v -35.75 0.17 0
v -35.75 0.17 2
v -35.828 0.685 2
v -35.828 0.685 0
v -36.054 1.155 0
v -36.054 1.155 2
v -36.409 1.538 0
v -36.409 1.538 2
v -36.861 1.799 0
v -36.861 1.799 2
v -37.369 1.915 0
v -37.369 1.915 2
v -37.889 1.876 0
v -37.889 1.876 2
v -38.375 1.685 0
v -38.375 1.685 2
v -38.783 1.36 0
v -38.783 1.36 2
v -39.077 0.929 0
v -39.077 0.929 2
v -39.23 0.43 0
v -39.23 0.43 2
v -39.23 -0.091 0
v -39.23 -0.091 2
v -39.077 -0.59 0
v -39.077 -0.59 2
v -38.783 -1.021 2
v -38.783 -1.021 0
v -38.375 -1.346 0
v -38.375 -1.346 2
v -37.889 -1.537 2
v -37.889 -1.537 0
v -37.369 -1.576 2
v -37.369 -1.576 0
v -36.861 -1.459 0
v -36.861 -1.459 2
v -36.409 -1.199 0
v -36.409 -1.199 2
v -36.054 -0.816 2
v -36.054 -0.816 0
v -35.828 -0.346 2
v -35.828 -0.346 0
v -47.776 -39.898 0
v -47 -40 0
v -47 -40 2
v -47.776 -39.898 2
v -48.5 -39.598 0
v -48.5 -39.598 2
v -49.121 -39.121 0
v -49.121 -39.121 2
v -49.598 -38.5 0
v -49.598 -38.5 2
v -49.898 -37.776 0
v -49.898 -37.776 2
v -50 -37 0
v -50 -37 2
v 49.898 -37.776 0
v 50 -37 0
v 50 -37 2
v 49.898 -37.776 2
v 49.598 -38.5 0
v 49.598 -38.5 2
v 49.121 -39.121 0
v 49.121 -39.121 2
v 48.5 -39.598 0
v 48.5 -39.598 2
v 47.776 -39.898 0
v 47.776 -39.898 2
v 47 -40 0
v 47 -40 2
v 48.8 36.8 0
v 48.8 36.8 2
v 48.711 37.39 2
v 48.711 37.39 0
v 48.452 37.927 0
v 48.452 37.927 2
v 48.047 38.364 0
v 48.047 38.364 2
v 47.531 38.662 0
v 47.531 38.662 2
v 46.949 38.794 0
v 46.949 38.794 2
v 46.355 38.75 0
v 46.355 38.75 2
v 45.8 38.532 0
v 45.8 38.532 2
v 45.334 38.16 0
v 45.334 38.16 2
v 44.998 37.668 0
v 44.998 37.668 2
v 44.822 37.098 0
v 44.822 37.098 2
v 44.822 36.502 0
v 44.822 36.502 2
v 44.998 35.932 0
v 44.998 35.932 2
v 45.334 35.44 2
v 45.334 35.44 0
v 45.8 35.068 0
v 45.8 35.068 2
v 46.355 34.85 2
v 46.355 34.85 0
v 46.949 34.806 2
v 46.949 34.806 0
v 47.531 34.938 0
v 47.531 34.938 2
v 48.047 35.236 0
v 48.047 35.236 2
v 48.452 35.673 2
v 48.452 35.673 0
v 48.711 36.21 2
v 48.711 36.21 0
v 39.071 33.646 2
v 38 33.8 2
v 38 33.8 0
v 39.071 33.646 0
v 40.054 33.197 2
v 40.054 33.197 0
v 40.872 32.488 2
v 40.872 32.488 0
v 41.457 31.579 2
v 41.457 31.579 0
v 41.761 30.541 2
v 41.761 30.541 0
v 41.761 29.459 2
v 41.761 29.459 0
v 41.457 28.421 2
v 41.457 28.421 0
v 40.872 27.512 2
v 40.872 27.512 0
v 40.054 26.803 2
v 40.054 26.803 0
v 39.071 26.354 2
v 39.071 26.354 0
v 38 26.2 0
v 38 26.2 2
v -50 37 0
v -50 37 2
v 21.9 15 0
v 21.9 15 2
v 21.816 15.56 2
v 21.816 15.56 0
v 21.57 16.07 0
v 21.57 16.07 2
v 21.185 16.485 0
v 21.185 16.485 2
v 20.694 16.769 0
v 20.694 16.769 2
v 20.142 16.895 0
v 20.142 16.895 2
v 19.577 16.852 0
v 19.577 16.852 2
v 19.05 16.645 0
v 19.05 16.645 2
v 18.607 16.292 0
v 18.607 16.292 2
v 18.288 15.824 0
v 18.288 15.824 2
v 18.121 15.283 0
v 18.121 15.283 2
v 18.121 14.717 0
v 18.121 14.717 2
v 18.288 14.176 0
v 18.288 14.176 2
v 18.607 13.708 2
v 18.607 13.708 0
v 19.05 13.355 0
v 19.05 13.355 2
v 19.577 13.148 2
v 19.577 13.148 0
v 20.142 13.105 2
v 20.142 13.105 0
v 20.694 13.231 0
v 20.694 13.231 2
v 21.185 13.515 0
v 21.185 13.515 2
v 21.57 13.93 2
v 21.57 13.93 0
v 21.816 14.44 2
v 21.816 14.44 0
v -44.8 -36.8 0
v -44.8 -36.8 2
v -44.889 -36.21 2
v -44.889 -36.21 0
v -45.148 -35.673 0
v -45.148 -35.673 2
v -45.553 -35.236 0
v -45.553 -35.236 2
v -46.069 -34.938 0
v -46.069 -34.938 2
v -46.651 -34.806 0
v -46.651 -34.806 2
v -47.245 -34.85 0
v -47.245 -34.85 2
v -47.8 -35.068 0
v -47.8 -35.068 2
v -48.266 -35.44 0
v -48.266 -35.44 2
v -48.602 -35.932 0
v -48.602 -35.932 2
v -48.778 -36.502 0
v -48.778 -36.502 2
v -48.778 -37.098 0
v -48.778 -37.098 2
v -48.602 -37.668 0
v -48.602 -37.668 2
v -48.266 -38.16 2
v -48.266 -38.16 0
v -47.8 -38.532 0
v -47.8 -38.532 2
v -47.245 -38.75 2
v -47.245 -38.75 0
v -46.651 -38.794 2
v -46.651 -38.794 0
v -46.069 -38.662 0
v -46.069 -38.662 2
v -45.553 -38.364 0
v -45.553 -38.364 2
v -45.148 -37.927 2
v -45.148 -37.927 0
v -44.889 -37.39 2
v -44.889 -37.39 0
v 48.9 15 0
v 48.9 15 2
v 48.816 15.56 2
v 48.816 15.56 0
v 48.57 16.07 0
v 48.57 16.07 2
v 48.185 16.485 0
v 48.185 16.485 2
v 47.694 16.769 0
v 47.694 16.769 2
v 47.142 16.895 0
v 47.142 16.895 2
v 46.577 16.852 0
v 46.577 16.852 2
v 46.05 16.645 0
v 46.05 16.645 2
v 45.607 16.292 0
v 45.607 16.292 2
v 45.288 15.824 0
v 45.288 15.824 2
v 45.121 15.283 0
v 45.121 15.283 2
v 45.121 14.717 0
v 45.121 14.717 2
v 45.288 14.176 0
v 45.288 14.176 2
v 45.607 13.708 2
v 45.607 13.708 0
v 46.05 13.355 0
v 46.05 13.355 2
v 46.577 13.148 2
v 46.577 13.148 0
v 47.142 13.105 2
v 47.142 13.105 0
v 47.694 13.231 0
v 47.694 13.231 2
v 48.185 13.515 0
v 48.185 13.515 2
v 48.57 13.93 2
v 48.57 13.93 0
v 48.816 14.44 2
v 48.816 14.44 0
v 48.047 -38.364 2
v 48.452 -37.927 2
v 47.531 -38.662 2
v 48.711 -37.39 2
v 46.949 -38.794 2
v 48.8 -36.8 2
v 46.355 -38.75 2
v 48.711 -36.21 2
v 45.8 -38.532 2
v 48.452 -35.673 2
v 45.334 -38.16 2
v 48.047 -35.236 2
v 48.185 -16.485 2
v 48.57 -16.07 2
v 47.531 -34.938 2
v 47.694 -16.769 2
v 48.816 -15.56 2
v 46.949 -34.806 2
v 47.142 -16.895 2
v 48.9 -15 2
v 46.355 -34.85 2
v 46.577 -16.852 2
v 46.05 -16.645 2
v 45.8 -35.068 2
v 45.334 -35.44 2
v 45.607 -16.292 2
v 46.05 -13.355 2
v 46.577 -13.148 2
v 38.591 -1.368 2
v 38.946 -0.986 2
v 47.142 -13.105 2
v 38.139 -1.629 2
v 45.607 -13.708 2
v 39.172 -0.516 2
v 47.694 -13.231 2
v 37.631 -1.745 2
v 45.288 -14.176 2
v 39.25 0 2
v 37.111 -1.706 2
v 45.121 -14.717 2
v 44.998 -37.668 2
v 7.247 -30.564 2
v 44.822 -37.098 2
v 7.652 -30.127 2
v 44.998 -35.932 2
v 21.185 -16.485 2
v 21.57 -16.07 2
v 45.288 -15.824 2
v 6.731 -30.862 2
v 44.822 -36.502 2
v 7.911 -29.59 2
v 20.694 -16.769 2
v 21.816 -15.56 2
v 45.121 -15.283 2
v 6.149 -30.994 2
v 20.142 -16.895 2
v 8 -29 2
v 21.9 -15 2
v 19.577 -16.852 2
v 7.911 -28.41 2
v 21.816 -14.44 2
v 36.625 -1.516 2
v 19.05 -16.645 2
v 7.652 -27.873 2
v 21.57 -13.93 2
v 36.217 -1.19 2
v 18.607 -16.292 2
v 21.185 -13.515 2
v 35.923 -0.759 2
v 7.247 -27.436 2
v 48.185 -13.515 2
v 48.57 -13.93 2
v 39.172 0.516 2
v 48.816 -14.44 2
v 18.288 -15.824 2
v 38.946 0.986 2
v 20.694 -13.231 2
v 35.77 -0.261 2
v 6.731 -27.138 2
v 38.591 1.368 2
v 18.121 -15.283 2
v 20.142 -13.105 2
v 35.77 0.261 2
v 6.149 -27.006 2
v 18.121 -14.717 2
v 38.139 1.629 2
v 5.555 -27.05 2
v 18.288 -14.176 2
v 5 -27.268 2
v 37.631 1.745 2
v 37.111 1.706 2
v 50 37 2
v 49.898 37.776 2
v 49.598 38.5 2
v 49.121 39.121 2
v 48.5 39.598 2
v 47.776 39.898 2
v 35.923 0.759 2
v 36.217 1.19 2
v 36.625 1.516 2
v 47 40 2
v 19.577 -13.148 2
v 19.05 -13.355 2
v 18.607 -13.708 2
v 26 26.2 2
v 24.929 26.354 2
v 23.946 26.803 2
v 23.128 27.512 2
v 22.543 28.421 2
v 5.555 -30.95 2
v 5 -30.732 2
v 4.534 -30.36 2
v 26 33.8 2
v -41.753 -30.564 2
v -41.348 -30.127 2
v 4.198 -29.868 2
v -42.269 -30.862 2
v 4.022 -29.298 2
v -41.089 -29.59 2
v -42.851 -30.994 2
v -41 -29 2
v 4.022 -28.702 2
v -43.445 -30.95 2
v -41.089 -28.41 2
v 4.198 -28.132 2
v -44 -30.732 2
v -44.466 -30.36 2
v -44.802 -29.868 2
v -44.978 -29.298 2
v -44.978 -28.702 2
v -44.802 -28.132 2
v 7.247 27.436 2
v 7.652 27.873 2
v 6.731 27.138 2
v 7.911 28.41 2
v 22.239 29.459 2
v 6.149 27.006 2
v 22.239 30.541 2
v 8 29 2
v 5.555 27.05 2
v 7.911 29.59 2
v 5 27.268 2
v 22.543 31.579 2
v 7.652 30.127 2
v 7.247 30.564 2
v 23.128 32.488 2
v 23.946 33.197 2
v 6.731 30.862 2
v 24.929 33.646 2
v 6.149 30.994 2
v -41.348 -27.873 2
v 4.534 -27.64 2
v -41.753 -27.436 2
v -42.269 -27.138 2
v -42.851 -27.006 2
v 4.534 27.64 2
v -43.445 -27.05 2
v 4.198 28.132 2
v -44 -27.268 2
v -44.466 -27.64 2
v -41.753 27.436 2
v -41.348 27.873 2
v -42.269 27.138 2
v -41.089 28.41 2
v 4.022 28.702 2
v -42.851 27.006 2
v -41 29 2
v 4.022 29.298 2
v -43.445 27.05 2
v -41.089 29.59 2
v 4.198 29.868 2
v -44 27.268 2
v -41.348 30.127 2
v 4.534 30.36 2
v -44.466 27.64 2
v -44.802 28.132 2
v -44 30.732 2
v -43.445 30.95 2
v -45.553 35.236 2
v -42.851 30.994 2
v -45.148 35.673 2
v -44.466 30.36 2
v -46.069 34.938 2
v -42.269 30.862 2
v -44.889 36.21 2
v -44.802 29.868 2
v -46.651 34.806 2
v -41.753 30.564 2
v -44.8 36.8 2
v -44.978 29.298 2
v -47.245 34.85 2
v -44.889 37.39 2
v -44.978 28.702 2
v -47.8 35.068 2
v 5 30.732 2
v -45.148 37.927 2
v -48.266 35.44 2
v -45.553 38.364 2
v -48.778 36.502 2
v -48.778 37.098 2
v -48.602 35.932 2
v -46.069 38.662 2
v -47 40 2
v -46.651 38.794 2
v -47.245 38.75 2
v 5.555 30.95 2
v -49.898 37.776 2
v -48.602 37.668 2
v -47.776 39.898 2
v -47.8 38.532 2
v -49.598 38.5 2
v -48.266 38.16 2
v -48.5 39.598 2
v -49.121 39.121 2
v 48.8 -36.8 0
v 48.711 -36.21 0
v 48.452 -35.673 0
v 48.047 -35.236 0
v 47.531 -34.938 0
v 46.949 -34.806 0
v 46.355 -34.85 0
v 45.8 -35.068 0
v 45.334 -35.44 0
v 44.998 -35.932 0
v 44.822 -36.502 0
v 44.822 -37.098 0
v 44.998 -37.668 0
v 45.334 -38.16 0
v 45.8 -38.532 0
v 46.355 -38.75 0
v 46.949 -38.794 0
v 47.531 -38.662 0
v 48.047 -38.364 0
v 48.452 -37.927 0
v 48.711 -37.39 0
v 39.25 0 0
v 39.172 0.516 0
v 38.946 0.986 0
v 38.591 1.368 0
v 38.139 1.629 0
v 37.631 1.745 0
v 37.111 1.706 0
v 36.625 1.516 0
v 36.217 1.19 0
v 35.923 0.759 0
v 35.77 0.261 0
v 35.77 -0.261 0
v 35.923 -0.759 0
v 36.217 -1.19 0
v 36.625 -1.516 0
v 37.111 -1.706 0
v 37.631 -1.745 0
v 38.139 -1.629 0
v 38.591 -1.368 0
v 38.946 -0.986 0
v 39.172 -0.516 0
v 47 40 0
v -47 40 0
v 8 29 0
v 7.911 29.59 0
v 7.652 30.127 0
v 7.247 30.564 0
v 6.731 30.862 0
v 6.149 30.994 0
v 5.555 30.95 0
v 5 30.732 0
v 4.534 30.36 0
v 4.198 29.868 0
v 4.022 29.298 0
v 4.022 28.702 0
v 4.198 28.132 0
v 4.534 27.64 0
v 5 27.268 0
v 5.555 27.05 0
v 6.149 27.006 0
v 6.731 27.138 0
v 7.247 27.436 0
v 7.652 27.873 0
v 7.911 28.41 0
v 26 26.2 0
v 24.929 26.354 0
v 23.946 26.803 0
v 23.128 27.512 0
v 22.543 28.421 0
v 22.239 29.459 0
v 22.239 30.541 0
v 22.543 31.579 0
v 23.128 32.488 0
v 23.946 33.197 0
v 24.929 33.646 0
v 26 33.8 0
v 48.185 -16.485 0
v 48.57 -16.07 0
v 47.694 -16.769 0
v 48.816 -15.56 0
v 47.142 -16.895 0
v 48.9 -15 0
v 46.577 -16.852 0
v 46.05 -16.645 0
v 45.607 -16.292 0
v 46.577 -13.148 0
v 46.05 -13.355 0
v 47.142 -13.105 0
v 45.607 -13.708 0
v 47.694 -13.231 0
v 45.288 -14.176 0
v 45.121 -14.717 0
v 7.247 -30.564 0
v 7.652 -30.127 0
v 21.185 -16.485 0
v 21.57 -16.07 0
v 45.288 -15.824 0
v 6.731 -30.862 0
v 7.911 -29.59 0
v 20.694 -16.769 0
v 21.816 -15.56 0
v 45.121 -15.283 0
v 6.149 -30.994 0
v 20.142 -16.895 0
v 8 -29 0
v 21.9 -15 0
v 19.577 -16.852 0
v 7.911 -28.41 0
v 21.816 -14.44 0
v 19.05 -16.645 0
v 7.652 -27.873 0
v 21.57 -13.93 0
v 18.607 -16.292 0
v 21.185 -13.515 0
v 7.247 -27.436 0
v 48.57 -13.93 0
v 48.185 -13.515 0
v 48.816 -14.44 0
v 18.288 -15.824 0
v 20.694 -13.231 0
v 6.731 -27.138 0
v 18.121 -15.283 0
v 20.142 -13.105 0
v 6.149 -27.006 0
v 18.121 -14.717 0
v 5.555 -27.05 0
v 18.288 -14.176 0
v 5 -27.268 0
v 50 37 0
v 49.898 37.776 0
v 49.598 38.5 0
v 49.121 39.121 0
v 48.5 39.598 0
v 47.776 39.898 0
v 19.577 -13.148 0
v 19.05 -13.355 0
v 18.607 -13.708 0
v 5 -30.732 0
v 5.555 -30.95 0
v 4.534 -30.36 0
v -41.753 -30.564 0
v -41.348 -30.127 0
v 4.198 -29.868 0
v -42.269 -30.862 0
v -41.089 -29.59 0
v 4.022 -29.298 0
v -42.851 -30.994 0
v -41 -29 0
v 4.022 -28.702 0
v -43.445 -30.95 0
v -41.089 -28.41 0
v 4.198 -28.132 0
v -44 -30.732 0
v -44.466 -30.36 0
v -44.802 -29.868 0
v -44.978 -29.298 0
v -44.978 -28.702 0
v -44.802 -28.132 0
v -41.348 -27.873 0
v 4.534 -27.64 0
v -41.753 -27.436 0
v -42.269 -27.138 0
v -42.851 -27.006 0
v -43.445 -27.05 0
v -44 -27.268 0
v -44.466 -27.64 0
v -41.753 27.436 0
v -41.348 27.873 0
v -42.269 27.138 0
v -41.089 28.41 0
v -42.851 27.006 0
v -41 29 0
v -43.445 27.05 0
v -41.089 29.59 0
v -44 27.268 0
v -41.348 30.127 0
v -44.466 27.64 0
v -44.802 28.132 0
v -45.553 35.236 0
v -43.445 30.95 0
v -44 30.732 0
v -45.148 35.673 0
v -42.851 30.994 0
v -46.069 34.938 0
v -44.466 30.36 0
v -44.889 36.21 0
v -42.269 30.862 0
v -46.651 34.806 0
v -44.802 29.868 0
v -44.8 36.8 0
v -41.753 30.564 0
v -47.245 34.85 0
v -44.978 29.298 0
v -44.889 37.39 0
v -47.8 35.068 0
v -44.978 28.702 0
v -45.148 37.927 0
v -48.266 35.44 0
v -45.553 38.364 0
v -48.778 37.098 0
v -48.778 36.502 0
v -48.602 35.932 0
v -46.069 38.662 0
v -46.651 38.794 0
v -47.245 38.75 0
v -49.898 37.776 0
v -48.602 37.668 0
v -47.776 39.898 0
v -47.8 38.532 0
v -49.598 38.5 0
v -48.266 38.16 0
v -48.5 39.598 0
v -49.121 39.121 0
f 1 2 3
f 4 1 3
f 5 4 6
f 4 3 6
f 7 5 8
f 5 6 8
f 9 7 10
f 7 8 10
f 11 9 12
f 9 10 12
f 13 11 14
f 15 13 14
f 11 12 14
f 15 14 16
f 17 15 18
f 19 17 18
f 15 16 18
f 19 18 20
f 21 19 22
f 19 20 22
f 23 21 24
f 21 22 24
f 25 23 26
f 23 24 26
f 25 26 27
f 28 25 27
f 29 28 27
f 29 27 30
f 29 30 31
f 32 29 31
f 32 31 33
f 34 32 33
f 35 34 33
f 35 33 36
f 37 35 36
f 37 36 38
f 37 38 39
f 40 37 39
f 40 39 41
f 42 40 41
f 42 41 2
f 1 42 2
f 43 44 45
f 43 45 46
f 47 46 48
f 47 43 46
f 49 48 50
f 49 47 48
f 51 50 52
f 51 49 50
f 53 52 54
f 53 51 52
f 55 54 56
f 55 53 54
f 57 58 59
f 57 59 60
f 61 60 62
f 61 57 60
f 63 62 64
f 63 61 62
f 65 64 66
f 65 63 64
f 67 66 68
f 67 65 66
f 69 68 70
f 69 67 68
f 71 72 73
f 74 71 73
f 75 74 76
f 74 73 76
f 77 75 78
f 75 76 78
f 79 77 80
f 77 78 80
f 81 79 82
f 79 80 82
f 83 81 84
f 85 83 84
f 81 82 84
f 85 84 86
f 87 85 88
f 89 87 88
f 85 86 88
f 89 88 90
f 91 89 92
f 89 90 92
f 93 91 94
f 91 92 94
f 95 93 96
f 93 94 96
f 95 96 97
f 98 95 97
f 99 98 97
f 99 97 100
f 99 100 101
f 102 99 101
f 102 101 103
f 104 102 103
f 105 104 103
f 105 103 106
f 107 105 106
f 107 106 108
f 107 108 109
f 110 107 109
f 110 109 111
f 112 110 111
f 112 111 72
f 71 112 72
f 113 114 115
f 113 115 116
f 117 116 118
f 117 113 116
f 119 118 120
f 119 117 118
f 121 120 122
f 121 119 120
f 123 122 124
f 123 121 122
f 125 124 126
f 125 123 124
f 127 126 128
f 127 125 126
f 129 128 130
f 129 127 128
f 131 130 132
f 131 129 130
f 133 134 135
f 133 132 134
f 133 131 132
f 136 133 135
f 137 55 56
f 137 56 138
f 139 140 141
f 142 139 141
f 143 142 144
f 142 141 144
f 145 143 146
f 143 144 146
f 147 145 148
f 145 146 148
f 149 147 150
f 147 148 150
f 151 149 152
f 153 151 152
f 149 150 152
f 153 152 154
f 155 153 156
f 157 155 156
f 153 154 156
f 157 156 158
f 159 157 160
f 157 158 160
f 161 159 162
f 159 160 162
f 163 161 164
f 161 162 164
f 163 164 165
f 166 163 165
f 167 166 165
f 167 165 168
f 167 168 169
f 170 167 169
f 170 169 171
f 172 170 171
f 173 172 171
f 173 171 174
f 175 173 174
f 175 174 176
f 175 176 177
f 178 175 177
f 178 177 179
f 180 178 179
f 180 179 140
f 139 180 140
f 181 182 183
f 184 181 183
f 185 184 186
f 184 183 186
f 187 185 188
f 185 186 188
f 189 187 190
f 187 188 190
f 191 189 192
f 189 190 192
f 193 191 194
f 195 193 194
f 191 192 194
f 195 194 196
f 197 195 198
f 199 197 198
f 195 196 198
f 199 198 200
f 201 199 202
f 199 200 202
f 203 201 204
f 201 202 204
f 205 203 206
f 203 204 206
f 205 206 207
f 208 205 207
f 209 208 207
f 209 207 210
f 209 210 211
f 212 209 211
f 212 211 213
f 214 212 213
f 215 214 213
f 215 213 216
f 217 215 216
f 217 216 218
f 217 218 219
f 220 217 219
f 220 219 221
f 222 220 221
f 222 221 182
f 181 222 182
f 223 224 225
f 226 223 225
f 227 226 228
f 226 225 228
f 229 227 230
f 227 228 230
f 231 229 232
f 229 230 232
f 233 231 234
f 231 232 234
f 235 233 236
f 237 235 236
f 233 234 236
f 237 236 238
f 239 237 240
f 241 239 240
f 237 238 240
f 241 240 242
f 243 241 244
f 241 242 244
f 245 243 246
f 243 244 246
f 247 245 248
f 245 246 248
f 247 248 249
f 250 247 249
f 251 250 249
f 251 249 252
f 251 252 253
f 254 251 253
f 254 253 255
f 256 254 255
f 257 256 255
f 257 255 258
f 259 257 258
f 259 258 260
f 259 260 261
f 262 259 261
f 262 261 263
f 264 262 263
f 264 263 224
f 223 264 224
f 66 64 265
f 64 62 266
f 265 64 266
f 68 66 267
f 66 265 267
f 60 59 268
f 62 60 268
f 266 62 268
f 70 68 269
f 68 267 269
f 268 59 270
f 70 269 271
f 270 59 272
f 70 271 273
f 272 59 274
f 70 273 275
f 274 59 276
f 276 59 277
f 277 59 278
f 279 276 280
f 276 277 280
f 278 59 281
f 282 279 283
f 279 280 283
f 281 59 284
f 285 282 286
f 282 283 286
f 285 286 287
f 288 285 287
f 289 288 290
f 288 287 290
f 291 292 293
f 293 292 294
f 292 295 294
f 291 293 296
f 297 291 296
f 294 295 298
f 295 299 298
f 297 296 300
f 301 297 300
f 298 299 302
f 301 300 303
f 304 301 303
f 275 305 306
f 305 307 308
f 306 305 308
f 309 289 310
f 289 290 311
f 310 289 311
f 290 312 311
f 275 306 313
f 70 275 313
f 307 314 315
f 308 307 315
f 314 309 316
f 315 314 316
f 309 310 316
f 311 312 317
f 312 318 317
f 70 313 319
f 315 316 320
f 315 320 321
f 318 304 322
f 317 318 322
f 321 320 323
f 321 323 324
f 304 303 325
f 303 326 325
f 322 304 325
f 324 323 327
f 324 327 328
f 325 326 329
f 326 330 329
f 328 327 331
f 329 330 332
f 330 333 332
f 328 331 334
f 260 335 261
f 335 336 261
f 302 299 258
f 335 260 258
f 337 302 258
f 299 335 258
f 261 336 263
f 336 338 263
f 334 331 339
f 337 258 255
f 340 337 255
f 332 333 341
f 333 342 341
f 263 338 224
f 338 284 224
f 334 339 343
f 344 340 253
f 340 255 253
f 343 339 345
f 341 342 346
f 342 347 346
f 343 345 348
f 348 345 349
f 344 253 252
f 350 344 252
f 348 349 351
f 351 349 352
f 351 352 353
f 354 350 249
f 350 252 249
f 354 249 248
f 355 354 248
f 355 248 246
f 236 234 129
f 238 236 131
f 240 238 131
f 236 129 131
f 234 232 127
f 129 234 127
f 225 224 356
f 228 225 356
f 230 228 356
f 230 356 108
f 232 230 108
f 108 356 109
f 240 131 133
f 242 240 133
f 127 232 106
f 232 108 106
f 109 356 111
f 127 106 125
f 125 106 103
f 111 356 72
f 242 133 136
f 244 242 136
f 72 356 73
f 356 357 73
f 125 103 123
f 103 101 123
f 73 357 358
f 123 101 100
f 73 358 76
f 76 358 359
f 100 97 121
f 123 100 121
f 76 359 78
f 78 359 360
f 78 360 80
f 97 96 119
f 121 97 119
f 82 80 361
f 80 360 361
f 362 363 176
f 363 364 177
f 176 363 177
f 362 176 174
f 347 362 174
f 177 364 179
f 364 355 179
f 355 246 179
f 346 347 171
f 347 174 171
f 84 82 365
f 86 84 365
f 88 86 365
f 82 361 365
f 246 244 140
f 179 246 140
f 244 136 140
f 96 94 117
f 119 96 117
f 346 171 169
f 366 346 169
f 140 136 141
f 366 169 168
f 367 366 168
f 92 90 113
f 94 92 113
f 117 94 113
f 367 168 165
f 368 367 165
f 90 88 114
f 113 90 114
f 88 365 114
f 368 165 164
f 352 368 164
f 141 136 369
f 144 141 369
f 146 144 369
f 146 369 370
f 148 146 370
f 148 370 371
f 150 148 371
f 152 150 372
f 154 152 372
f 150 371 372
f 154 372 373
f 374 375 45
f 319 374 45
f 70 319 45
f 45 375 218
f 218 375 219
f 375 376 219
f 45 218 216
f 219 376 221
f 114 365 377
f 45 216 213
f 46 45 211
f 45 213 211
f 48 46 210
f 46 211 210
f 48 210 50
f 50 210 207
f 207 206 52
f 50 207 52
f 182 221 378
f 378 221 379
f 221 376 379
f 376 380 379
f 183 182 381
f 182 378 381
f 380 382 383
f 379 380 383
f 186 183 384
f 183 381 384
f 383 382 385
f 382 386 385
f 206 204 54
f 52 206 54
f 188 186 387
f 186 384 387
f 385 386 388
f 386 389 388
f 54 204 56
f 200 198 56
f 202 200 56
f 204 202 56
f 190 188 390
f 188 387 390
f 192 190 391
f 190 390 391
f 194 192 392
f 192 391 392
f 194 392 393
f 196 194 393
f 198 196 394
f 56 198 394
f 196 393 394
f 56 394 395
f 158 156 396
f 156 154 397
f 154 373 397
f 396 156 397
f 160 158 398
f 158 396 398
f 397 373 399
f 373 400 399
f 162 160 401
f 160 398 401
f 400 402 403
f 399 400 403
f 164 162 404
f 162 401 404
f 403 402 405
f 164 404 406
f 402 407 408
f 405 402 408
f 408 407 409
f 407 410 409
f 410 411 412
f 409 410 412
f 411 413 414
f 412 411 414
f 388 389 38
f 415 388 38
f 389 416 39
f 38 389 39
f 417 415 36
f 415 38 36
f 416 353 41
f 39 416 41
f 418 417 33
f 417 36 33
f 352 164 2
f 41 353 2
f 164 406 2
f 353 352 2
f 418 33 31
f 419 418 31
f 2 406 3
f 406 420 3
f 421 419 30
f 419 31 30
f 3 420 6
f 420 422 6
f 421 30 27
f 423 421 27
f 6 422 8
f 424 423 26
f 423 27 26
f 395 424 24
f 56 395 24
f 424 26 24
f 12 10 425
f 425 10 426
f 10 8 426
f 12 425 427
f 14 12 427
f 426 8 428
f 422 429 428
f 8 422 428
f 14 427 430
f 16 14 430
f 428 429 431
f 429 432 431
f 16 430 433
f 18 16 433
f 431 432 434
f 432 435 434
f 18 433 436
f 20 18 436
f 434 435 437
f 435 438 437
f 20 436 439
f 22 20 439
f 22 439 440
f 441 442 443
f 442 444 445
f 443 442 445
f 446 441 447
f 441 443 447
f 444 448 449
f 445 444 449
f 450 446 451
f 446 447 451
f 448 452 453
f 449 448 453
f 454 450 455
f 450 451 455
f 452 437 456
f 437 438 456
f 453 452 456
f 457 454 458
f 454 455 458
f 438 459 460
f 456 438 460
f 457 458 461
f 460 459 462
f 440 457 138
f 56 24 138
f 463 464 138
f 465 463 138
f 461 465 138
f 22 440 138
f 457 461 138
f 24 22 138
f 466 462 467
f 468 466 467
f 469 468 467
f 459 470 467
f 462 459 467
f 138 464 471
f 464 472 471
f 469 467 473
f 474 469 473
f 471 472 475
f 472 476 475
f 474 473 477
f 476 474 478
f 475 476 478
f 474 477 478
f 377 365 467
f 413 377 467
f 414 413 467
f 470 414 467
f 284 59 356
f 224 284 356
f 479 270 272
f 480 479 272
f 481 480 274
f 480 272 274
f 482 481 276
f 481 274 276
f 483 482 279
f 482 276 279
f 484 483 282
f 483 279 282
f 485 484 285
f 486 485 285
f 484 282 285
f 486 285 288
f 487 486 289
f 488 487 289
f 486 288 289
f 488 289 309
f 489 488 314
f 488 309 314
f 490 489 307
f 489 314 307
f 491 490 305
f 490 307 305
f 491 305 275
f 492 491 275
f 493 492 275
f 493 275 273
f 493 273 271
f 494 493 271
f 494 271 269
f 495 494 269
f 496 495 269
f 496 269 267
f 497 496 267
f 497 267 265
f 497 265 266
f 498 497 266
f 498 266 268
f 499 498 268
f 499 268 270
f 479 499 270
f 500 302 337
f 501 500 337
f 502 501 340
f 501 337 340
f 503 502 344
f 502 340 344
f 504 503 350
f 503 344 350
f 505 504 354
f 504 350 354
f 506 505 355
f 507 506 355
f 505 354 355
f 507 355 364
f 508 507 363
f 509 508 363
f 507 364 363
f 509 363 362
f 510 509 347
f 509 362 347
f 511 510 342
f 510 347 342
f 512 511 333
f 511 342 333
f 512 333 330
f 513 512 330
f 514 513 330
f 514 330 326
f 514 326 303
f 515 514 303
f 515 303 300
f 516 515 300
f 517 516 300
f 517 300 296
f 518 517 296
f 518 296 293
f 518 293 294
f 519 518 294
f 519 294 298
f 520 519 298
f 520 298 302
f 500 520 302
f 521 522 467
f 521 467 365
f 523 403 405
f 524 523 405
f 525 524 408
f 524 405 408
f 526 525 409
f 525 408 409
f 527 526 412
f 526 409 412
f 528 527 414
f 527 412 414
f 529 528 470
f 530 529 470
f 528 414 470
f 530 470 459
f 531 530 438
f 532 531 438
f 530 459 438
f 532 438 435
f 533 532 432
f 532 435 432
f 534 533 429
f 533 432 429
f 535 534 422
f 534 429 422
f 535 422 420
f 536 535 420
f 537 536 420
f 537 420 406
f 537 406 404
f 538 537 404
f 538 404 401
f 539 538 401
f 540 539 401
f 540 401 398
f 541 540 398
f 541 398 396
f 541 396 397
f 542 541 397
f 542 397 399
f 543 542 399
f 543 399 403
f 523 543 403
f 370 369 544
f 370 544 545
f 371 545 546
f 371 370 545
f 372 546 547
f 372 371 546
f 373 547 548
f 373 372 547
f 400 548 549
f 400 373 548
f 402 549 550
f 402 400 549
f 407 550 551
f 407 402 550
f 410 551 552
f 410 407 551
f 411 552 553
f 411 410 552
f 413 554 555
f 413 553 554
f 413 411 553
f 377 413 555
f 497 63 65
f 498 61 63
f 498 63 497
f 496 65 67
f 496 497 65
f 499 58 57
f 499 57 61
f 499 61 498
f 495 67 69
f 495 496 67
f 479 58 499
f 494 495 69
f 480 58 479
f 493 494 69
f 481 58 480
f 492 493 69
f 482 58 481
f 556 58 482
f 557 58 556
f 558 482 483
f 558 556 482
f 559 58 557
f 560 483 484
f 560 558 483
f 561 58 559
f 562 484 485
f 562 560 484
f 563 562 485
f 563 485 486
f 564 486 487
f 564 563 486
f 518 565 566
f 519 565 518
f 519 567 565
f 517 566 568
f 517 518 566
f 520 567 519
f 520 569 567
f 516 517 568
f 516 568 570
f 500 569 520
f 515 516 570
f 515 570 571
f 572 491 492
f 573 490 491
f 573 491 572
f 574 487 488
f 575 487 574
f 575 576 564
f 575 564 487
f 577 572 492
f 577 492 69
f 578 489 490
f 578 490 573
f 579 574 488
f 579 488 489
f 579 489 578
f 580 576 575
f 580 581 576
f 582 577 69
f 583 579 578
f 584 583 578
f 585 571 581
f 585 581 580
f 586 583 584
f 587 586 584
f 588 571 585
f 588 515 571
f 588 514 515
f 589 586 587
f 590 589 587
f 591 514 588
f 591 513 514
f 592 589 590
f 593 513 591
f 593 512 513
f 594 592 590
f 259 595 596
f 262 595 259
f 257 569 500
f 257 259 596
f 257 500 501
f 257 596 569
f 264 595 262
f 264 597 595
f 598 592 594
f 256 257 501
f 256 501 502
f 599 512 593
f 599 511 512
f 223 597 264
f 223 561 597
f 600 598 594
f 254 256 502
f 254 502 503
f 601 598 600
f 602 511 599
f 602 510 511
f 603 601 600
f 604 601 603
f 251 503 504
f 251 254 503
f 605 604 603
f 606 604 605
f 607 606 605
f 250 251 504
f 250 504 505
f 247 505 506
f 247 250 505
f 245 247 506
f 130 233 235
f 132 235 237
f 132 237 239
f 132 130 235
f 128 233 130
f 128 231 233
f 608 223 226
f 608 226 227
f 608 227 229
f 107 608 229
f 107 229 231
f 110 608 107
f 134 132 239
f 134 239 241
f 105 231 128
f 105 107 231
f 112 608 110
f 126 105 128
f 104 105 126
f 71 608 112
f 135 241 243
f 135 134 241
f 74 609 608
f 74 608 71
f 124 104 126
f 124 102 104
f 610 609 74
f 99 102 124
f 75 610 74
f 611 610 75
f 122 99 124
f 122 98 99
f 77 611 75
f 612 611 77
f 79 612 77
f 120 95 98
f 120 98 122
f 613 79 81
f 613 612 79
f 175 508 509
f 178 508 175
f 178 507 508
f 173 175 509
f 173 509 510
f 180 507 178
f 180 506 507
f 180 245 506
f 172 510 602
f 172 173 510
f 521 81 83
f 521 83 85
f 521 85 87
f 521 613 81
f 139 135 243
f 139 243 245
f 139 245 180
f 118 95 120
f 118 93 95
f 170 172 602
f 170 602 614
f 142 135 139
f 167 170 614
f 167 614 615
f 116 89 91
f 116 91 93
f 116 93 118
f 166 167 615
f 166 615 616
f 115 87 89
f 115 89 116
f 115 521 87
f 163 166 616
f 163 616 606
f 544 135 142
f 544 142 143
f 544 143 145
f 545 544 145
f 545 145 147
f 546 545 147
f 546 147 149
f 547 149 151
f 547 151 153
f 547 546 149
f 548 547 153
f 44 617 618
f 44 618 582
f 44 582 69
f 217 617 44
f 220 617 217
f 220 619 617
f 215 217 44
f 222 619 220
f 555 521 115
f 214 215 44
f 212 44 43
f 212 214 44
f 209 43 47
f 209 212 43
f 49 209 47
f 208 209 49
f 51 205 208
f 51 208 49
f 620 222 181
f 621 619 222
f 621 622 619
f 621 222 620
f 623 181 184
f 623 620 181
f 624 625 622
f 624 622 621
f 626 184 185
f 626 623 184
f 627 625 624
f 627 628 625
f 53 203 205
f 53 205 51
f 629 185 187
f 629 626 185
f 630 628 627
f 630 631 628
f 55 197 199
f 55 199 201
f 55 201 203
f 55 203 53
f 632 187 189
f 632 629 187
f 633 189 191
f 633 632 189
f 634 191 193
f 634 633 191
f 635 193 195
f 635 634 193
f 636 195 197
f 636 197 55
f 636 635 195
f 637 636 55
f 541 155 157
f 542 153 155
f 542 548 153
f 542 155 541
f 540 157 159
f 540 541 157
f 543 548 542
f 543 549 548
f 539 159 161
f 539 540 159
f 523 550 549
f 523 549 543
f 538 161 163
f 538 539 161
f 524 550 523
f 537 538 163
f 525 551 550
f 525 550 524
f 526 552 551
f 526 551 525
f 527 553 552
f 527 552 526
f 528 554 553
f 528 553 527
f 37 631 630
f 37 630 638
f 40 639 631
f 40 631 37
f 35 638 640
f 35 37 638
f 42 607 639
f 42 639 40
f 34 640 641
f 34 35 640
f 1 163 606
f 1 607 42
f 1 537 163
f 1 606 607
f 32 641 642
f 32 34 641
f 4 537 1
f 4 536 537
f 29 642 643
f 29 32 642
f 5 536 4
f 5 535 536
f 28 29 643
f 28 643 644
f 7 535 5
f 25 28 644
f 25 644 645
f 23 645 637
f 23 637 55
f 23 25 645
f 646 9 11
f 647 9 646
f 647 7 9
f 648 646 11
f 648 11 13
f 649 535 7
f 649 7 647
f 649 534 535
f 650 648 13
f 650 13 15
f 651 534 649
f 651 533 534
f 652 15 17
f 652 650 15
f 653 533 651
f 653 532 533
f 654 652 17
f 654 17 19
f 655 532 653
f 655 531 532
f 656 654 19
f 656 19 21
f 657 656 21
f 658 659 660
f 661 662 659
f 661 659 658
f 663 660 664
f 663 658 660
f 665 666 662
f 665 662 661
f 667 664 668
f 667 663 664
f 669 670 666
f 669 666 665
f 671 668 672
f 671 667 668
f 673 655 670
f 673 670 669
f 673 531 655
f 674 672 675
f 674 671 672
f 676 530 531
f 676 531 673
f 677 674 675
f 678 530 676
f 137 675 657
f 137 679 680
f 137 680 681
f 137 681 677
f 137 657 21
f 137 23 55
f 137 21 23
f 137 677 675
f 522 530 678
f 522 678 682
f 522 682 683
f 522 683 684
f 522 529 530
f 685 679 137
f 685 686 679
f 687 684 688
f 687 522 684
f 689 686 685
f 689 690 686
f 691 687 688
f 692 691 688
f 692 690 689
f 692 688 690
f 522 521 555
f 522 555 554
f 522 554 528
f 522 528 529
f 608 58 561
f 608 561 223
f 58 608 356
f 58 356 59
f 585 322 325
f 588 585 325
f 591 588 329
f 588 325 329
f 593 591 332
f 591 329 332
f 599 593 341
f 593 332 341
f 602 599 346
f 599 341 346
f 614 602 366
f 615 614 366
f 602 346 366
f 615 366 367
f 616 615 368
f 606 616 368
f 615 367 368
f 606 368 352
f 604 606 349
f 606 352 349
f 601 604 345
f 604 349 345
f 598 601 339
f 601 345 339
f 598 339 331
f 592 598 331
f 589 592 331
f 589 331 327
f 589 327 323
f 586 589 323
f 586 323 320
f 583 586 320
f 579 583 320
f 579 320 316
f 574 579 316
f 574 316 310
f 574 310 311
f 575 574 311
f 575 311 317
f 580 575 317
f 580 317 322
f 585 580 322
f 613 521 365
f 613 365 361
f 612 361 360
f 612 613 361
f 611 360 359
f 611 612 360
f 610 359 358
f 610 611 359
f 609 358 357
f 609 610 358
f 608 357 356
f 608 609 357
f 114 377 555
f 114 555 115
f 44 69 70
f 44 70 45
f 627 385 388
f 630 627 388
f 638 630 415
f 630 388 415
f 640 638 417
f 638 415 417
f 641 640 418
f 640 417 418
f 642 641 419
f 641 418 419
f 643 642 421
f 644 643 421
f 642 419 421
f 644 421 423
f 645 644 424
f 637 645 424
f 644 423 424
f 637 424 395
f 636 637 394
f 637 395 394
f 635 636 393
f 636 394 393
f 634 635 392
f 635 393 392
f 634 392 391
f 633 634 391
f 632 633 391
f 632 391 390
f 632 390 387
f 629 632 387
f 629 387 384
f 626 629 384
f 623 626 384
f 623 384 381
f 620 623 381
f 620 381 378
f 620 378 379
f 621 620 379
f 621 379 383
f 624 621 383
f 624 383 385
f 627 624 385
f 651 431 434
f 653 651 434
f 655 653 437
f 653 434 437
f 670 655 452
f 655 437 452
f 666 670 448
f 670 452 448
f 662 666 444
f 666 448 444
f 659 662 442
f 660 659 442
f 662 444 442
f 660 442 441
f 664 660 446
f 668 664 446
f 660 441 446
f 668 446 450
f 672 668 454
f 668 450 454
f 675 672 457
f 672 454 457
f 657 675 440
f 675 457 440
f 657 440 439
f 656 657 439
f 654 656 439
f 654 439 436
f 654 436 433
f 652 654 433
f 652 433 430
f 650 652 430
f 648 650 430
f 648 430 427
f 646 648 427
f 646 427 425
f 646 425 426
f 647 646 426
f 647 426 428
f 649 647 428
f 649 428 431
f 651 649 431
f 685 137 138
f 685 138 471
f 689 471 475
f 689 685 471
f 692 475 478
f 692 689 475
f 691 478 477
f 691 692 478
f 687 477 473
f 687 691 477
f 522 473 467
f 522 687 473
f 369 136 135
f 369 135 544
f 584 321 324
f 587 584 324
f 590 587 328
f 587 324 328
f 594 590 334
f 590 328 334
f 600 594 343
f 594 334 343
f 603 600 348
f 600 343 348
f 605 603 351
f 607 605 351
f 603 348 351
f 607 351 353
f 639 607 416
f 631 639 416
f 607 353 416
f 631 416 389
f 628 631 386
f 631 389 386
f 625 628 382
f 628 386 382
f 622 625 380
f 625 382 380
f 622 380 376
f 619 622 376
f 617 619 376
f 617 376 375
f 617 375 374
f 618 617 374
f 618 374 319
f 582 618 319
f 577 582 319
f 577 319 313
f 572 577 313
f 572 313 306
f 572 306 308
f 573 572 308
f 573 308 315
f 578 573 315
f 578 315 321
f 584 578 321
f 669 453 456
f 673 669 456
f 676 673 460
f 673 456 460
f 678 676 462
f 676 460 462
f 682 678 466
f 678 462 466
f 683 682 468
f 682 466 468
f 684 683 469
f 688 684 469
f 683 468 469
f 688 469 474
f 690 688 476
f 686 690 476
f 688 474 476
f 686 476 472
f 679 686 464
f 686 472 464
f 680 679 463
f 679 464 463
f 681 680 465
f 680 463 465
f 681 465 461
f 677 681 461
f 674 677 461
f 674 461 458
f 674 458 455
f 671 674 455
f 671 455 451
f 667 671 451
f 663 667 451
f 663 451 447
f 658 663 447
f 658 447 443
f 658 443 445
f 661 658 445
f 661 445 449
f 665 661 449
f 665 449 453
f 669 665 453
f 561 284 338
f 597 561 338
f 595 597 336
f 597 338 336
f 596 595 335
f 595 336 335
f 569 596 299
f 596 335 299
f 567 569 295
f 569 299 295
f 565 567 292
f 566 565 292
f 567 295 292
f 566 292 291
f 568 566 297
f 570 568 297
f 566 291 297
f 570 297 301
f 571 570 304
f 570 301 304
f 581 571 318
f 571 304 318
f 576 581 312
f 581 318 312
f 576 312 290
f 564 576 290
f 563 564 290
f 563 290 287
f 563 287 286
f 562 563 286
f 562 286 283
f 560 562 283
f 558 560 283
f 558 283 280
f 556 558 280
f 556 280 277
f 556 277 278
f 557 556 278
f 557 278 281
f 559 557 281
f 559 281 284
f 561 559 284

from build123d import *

# Parameters (mm, degrees)
EXTRUDE_1_DEPTH     = 2
SKETCH_2_R          = 2
SKETCH_2_R_2        = 1.9
CUT_EXTRUDE_1_DEPTH = 3
CUT_EXTRUDE_2_DEPTH = 3
SKETCH_4_R          = 1.75
CUT_EXTRUDE_3_DEPTH = 3


with BuildPart() as part:
    # 草图1 → 凸台-拉伸1 (new body)
    with BuildSketch(Plane.XY):
        with BuildLine():
            Line((-47, 40), (47, 40))
            ThreePointArc((47, 40), (49.121320344, 39.121320344), (50, 37))
            Line((50, 37), (50, -37))
            ThreePointArc((50, -37), (49.121320344, -39.121320344), (47, -40))
            Line((47, -40), (-47, -40))
            ThreePointArc((-47, -40), (-49.121320344, -39.121320344), (-50, -37))
            Line((-50, -37), (-50, 37))
            ThreePointArc((-50, 37), (-49.121320344, 39.121320344), (-47, 40))
        make_face()
    extrude(amount=EXTRUDE_1_DEPTH)

    # 草图2 → 切除-拉伸1 (cut, through all)
    with BuildSketch(Plane.XY.offset(2)):
        with Locations((-46.8, 36.8)):
            Circle(SKETCH_2_R)
        with Locations((46.8, 36.8)):
            Circle(SKETCH_2_R)
        with Locations((46.8, -36.8)):
            Circle(SKETCH_2_R)
        with Locations((-46.8, -36.8)):
            Circle(SKETCH_2_R)
        with Locations((-43, 29)):
            Circle(SKETCH_2_R)
        with Locations((6, 29)):
            Circle(SKETCH_2_R)
        with Locations((6, -29)):
            Circle(SKETCH_2_R)
        with Locations((-43, -29)):
            Circle(SKETCH_2_R)
        with Locations((47, -15)):
            Circle(SKETCH_2_R_2)
        with Locations((20, 15)):
            Circle(SKETCH_2_R_2)
        with Locations((20, -15)):
            Circle(SKETCH_2_R_2)
        with Locations((47, 15)):
            Circle(SKETCH_2_R_2)
    extrude(amount=-CUT_EXTRUDE_1_DEPTH, mode=Mode.SUBTRACT)

    # 草图3 → 切除-拉伸2 (cut, through all)
    with BuildSketch(Plane.XY.offset(2)):
        with BuildLine():
            Line((26, 33.8), (38, 33.8))
            ThreePointArc((38, 33.8), (41.8, 30), (38, 26.2))
            Line((38, 26.2), (26, 26.2))
            ThreePointArc((26, 26.2), (22.2, 30), (26, 33.8))
        make_face()
    extrude(amount=-CUT_EXTRUDE_2_DEPTH, mode=Mode.SUBTRACT)

    # 草图4 → 切除-拉伸3 (cut, through all)
    with BuildSketch(Plane.XY.offset(2)):
        with Locations((-37.5, 0.169558906)):
            Circle(SKETCH_4_R)
        with Locations((37.5, 0)):
            Circle(SKETCH_4_R)
    extrude(amount=-CUT_EXTRUDE_3_DEPTH, mode=Mode.SUBTRACT)


solid = part.part
